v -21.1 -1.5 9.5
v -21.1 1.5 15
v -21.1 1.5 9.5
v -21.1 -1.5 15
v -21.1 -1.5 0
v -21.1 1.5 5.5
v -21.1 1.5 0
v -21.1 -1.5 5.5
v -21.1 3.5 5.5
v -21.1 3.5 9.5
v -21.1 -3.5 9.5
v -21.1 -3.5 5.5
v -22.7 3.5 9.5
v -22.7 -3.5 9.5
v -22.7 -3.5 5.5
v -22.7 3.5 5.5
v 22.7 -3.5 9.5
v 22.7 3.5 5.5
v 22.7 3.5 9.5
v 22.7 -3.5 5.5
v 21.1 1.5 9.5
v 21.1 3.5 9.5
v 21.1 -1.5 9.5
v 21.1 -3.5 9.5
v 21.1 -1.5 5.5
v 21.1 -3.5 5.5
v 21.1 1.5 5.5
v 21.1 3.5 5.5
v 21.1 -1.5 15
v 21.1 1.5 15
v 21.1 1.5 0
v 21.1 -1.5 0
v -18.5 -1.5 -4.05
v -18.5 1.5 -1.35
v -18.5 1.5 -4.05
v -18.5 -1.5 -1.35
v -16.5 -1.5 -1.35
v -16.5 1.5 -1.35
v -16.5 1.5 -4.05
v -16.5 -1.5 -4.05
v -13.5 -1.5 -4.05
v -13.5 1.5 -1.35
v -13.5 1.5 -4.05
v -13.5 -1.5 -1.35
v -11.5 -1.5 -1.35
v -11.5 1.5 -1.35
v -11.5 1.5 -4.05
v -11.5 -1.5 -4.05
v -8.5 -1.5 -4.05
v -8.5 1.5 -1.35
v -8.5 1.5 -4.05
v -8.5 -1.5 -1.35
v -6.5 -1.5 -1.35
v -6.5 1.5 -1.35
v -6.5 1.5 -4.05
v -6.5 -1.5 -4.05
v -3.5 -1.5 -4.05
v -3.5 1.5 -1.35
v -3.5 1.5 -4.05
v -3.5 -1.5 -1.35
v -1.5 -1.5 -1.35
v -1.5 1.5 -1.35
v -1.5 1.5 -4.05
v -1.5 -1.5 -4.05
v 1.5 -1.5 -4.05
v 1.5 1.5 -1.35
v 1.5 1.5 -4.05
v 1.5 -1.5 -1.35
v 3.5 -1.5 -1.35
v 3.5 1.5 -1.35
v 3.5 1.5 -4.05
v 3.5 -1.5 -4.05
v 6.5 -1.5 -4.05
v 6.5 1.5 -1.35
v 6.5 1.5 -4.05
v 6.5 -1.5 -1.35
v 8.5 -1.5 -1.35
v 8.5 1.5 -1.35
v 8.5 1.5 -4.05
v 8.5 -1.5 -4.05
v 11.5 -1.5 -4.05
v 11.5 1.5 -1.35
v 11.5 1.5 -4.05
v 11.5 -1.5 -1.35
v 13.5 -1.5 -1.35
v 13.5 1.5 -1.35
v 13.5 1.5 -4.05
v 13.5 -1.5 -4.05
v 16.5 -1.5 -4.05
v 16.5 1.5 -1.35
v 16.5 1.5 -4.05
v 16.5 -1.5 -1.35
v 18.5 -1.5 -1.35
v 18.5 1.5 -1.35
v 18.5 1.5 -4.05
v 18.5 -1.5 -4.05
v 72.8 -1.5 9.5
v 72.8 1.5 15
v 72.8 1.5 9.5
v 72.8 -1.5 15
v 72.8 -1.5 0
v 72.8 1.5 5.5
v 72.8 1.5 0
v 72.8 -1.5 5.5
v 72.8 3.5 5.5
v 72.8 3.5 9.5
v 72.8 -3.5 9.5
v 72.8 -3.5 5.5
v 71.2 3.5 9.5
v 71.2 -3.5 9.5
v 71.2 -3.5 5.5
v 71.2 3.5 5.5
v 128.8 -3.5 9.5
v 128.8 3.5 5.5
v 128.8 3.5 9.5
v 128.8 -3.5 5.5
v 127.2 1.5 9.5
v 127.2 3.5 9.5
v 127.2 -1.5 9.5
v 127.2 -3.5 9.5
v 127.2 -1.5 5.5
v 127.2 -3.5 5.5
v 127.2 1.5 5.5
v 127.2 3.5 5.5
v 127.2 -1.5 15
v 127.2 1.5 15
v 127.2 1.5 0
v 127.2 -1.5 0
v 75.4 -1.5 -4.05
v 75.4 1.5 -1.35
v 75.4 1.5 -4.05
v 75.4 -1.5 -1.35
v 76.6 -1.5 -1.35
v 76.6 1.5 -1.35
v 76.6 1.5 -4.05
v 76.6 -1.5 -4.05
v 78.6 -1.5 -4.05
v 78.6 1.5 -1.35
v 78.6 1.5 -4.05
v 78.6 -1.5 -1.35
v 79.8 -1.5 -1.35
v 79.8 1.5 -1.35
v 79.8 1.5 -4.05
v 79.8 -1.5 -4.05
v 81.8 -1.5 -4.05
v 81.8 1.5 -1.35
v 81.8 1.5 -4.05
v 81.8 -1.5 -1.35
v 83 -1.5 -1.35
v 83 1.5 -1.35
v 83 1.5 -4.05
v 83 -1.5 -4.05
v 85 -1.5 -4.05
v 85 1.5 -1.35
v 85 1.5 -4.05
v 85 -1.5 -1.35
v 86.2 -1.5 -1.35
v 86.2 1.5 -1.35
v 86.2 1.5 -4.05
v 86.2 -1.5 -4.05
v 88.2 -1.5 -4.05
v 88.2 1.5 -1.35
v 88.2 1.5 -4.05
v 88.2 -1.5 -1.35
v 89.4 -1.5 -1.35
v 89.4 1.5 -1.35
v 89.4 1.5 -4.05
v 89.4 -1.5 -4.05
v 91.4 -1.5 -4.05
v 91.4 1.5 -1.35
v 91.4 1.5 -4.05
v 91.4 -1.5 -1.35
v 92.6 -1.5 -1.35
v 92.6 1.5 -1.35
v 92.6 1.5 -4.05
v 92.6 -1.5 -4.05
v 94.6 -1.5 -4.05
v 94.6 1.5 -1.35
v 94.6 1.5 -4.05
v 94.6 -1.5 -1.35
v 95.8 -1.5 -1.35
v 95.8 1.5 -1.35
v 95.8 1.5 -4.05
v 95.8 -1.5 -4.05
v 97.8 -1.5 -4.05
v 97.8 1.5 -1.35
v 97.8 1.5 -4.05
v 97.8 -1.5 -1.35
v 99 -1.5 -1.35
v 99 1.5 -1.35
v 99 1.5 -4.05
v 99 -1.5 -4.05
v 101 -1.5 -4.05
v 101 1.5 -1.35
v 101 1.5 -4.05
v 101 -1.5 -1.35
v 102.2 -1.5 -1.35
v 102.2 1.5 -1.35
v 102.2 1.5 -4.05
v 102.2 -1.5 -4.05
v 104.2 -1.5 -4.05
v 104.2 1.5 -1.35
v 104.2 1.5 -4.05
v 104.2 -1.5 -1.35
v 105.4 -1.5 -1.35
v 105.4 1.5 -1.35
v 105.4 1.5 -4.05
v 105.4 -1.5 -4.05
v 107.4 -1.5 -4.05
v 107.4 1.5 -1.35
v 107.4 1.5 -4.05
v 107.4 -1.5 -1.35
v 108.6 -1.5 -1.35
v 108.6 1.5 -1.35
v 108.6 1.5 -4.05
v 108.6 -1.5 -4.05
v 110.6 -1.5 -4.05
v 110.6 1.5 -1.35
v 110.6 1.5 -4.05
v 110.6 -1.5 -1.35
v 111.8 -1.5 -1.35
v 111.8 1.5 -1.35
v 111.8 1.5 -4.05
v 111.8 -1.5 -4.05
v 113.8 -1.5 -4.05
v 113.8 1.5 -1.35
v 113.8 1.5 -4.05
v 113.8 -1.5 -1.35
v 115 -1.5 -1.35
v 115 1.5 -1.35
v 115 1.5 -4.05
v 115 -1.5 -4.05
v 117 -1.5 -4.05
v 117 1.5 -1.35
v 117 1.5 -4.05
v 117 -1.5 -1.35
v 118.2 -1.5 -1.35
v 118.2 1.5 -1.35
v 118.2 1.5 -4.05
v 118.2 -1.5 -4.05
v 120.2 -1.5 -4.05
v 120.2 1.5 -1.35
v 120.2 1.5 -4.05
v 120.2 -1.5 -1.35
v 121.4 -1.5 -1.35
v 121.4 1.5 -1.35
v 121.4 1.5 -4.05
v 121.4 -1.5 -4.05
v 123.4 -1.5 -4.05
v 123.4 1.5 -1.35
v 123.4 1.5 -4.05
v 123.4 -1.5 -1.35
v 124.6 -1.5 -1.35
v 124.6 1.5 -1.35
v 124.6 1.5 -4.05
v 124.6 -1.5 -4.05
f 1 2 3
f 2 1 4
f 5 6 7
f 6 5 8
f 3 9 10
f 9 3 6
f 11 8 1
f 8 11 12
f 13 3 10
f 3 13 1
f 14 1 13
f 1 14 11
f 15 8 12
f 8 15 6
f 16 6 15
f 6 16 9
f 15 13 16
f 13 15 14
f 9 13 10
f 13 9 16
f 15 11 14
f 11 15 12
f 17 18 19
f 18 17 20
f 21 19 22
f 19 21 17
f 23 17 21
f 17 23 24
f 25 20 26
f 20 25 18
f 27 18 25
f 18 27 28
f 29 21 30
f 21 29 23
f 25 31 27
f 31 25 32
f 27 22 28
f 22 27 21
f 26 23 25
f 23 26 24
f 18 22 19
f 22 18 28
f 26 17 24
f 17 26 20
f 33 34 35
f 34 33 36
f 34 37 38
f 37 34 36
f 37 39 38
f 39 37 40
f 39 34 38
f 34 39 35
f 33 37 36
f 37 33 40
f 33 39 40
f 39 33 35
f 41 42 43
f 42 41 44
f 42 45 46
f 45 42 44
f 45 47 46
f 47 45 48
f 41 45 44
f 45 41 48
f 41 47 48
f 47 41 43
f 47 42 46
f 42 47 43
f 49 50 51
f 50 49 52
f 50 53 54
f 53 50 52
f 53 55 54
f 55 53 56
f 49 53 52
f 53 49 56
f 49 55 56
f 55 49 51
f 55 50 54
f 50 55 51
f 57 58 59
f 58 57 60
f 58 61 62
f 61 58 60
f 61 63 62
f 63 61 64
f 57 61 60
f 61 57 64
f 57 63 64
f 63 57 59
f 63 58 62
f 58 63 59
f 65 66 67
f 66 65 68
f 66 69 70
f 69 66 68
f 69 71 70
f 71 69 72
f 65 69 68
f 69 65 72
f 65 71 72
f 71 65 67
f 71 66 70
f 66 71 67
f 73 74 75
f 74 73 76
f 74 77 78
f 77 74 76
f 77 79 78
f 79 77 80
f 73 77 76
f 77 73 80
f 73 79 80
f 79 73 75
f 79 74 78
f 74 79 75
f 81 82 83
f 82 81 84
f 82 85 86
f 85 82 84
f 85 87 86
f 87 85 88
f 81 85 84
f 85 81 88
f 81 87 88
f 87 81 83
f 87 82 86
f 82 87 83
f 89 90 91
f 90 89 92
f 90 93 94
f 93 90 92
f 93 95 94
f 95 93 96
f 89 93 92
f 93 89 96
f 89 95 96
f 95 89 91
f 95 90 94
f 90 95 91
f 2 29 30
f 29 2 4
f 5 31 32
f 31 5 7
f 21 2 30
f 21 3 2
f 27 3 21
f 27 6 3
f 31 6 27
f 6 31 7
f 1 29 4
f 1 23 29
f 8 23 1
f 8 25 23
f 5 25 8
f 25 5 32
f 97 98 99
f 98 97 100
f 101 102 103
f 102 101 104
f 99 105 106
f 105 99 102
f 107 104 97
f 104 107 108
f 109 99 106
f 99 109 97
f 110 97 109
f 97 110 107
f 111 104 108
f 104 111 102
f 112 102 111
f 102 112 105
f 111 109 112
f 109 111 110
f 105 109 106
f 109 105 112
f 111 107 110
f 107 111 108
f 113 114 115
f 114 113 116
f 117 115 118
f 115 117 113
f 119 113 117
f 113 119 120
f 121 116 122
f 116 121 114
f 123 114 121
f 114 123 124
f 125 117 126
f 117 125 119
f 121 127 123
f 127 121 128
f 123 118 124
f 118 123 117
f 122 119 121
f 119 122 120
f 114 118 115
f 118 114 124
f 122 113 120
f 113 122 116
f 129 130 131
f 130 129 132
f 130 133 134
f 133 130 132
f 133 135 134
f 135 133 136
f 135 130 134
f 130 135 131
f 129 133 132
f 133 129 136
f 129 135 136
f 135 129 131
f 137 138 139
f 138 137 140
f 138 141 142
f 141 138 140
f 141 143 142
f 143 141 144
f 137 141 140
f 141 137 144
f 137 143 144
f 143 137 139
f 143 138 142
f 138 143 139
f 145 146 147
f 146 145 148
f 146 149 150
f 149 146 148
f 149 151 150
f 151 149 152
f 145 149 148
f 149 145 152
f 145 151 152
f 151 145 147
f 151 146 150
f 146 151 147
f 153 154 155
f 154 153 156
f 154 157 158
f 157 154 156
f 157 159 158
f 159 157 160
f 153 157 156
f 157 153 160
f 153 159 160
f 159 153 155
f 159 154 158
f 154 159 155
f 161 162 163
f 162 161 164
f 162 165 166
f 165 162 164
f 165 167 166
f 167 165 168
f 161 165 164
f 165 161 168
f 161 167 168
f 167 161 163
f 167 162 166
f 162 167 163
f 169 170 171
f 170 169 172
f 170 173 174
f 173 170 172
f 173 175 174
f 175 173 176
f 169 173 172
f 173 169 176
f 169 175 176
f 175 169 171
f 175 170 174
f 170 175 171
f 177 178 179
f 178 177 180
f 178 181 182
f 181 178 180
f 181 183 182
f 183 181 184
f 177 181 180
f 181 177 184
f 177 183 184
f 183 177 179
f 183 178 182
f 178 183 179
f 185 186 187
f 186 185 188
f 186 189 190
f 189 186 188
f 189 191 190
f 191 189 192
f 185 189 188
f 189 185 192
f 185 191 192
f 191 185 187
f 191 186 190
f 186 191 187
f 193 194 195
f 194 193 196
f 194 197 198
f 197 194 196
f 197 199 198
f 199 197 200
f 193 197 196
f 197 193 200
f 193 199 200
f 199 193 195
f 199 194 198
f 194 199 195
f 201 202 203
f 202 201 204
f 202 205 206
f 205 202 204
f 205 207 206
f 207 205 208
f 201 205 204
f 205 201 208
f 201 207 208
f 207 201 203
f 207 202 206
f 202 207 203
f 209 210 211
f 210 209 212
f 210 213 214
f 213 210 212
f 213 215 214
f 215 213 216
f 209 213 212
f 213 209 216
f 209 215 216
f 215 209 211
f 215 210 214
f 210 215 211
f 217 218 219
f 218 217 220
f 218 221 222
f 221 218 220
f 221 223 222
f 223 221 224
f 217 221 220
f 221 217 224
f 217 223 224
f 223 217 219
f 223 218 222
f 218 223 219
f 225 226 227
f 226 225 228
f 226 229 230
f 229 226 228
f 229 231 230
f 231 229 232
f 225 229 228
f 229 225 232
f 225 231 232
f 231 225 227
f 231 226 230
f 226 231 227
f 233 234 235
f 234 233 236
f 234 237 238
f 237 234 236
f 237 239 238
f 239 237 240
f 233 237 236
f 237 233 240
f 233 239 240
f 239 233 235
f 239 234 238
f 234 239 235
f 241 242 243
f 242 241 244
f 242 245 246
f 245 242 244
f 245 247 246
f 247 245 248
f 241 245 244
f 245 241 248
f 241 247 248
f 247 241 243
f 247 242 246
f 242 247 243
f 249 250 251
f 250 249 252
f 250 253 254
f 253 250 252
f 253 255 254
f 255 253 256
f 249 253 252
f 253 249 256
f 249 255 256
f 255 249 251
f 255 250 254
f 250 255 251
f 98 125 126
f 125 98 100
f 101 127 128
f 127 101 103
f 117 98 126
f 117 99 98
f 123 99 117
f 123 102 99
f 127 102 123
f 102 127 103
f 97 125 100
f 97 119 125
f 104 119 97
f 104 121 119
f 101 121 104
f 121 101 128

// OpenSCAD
// Marc Lab — Parametric Gel Comb
// Generates 8-tooth and 16-tooth variants side by side for a single slice job.
// Print with teeth pointing DOWN; supports on handle flat face only.
// Resin (MSLA): standard or ABS-like resin. Min feature: 1.2mm tooth width.

// ─── SHARED GEOMETRY ─────────────────────────────────────────────────────────
tooth_height     = 3.0;   // mm — depth the tooth sits in the gel (sets well depth)
handle_height    = 15.0;  // mm — portion above gel surface; grip zone
handle_thickness = 3.0;   // mm — comb body thickness front-to-back
slot_width       = 1.6;   // mm — tab that registers into enclosure wall channel
slot_depth       = 2.0;   // mm — how far the tab extends into the wall channel
slot_height      = 4.0;   // mm — vertical extent of the registration tab
fillet_r         = 0.3;   // mm — tooth tip radius; prevents stress cracking at root

gap_between      = 20.0;  // mm — space between the two rendered combs (for slicing)

// ─── MODULES ─────────────────────────────────────────────────────────────────

module tooth(tooth_width, tooth_height, handle_thickness) {
    // A single gel comb tooth with a rounded tip.
    // Origin at tooth base centre, extends downward in -Z.
    hull() {
        // Body of tooth (rectangular, minus tip rounding)
        translate([0, 0, -(tooth_height - fillet_r)])
            cube([tooth_width, handle_thickness, tooth_height - fillet_r], center=true);
        // Rounded tip
        translate([0, 0, -(tooth_height - fillet_r)])
            rotate([90, 0, 0])
                cylinder(r=fillet_r, h=handle_thickness, center=true, $fn=16);
    }
}

module slot_tab(handle_thickness) {
    // Registration tab on each end of the handle.
    // Slides into a matching channel in the enclosure side wall.
    cube([slot_width, handle_thickness + slot_depth * 2, slot_height], center=true);
}

module gel_comb(tooth_count, tooth_width, tooth_gap) {
    total_width = tooth_count * tooth_width + (tooth_count - 1) * tooth_gap;
    handle_w    = total_width + slot_width * 2 + 2.0; // 1mm overhang each side

    union() {
        // Handle bar
        translate([0, 0, handle_height / 2])
            cube([handle_w, handle_thickness, handle_height], center=true);

        // Registration tabs — one each end, centred vertically on the handle
        for (side = [-1, 1])
            translate([side * (handle_w / 2 + slot_width / 2), 0, handle_height / 2])
                slot_tab(handle_thickness);

        // Teeth — distributed evenly along the handle
        for (i = [0 : tooth_count - 1]) {
            x_pos = -total_width / 2 + tooth_width / 2 + i * (tooth_width + tooth_gap);
            translate([x_pos, 0, 0])
                tooth(tooth_width, tooth_height, handle_thickness);
        }
    }
}

// ─── RENDER ──────────────────────────────────────────────────────────────────
// 8-tooth comb (wider wells, ~15µL at 3mm depth)
// tooth_width=2.0, tooth_gap=3.0 → 10mm lane pitch (standard)
gel_comb(tooth_count=8, tooth_width=2.0, tooth_gap=3.0);

// 16-tooth comb (narrow wells, ~8µL at 3mm depth) — offset to the right
// tooth_width=1.2, tooth_gap=2.0 → 3.2mm lane pitch (tight but printable in MSLA)
translate([80 + gap_between, 0, 0])
    gel_comb(tooth_count=16, tooth_width=1.2, tooth_gap=2.0);

// ─── PRINT NOTES ─────────────────────────────────────────────────────────────
// Orient: teeth pointing DOWN on build plate
// Supports: auto-support on handle flat face; zero supports on tooth surfaces
// Layer height: 0.05mm for tooth tip accuracy
// Exposure: standard for your resin; reduce bottom layers to 4 to ease release
// Post-cure: IPA wash 2min, UV cure 60s — do not over-cure (embrittlement)
// Slot clearance: enclosure wall channel should be 1.7mm wide (0.1mm per side)
